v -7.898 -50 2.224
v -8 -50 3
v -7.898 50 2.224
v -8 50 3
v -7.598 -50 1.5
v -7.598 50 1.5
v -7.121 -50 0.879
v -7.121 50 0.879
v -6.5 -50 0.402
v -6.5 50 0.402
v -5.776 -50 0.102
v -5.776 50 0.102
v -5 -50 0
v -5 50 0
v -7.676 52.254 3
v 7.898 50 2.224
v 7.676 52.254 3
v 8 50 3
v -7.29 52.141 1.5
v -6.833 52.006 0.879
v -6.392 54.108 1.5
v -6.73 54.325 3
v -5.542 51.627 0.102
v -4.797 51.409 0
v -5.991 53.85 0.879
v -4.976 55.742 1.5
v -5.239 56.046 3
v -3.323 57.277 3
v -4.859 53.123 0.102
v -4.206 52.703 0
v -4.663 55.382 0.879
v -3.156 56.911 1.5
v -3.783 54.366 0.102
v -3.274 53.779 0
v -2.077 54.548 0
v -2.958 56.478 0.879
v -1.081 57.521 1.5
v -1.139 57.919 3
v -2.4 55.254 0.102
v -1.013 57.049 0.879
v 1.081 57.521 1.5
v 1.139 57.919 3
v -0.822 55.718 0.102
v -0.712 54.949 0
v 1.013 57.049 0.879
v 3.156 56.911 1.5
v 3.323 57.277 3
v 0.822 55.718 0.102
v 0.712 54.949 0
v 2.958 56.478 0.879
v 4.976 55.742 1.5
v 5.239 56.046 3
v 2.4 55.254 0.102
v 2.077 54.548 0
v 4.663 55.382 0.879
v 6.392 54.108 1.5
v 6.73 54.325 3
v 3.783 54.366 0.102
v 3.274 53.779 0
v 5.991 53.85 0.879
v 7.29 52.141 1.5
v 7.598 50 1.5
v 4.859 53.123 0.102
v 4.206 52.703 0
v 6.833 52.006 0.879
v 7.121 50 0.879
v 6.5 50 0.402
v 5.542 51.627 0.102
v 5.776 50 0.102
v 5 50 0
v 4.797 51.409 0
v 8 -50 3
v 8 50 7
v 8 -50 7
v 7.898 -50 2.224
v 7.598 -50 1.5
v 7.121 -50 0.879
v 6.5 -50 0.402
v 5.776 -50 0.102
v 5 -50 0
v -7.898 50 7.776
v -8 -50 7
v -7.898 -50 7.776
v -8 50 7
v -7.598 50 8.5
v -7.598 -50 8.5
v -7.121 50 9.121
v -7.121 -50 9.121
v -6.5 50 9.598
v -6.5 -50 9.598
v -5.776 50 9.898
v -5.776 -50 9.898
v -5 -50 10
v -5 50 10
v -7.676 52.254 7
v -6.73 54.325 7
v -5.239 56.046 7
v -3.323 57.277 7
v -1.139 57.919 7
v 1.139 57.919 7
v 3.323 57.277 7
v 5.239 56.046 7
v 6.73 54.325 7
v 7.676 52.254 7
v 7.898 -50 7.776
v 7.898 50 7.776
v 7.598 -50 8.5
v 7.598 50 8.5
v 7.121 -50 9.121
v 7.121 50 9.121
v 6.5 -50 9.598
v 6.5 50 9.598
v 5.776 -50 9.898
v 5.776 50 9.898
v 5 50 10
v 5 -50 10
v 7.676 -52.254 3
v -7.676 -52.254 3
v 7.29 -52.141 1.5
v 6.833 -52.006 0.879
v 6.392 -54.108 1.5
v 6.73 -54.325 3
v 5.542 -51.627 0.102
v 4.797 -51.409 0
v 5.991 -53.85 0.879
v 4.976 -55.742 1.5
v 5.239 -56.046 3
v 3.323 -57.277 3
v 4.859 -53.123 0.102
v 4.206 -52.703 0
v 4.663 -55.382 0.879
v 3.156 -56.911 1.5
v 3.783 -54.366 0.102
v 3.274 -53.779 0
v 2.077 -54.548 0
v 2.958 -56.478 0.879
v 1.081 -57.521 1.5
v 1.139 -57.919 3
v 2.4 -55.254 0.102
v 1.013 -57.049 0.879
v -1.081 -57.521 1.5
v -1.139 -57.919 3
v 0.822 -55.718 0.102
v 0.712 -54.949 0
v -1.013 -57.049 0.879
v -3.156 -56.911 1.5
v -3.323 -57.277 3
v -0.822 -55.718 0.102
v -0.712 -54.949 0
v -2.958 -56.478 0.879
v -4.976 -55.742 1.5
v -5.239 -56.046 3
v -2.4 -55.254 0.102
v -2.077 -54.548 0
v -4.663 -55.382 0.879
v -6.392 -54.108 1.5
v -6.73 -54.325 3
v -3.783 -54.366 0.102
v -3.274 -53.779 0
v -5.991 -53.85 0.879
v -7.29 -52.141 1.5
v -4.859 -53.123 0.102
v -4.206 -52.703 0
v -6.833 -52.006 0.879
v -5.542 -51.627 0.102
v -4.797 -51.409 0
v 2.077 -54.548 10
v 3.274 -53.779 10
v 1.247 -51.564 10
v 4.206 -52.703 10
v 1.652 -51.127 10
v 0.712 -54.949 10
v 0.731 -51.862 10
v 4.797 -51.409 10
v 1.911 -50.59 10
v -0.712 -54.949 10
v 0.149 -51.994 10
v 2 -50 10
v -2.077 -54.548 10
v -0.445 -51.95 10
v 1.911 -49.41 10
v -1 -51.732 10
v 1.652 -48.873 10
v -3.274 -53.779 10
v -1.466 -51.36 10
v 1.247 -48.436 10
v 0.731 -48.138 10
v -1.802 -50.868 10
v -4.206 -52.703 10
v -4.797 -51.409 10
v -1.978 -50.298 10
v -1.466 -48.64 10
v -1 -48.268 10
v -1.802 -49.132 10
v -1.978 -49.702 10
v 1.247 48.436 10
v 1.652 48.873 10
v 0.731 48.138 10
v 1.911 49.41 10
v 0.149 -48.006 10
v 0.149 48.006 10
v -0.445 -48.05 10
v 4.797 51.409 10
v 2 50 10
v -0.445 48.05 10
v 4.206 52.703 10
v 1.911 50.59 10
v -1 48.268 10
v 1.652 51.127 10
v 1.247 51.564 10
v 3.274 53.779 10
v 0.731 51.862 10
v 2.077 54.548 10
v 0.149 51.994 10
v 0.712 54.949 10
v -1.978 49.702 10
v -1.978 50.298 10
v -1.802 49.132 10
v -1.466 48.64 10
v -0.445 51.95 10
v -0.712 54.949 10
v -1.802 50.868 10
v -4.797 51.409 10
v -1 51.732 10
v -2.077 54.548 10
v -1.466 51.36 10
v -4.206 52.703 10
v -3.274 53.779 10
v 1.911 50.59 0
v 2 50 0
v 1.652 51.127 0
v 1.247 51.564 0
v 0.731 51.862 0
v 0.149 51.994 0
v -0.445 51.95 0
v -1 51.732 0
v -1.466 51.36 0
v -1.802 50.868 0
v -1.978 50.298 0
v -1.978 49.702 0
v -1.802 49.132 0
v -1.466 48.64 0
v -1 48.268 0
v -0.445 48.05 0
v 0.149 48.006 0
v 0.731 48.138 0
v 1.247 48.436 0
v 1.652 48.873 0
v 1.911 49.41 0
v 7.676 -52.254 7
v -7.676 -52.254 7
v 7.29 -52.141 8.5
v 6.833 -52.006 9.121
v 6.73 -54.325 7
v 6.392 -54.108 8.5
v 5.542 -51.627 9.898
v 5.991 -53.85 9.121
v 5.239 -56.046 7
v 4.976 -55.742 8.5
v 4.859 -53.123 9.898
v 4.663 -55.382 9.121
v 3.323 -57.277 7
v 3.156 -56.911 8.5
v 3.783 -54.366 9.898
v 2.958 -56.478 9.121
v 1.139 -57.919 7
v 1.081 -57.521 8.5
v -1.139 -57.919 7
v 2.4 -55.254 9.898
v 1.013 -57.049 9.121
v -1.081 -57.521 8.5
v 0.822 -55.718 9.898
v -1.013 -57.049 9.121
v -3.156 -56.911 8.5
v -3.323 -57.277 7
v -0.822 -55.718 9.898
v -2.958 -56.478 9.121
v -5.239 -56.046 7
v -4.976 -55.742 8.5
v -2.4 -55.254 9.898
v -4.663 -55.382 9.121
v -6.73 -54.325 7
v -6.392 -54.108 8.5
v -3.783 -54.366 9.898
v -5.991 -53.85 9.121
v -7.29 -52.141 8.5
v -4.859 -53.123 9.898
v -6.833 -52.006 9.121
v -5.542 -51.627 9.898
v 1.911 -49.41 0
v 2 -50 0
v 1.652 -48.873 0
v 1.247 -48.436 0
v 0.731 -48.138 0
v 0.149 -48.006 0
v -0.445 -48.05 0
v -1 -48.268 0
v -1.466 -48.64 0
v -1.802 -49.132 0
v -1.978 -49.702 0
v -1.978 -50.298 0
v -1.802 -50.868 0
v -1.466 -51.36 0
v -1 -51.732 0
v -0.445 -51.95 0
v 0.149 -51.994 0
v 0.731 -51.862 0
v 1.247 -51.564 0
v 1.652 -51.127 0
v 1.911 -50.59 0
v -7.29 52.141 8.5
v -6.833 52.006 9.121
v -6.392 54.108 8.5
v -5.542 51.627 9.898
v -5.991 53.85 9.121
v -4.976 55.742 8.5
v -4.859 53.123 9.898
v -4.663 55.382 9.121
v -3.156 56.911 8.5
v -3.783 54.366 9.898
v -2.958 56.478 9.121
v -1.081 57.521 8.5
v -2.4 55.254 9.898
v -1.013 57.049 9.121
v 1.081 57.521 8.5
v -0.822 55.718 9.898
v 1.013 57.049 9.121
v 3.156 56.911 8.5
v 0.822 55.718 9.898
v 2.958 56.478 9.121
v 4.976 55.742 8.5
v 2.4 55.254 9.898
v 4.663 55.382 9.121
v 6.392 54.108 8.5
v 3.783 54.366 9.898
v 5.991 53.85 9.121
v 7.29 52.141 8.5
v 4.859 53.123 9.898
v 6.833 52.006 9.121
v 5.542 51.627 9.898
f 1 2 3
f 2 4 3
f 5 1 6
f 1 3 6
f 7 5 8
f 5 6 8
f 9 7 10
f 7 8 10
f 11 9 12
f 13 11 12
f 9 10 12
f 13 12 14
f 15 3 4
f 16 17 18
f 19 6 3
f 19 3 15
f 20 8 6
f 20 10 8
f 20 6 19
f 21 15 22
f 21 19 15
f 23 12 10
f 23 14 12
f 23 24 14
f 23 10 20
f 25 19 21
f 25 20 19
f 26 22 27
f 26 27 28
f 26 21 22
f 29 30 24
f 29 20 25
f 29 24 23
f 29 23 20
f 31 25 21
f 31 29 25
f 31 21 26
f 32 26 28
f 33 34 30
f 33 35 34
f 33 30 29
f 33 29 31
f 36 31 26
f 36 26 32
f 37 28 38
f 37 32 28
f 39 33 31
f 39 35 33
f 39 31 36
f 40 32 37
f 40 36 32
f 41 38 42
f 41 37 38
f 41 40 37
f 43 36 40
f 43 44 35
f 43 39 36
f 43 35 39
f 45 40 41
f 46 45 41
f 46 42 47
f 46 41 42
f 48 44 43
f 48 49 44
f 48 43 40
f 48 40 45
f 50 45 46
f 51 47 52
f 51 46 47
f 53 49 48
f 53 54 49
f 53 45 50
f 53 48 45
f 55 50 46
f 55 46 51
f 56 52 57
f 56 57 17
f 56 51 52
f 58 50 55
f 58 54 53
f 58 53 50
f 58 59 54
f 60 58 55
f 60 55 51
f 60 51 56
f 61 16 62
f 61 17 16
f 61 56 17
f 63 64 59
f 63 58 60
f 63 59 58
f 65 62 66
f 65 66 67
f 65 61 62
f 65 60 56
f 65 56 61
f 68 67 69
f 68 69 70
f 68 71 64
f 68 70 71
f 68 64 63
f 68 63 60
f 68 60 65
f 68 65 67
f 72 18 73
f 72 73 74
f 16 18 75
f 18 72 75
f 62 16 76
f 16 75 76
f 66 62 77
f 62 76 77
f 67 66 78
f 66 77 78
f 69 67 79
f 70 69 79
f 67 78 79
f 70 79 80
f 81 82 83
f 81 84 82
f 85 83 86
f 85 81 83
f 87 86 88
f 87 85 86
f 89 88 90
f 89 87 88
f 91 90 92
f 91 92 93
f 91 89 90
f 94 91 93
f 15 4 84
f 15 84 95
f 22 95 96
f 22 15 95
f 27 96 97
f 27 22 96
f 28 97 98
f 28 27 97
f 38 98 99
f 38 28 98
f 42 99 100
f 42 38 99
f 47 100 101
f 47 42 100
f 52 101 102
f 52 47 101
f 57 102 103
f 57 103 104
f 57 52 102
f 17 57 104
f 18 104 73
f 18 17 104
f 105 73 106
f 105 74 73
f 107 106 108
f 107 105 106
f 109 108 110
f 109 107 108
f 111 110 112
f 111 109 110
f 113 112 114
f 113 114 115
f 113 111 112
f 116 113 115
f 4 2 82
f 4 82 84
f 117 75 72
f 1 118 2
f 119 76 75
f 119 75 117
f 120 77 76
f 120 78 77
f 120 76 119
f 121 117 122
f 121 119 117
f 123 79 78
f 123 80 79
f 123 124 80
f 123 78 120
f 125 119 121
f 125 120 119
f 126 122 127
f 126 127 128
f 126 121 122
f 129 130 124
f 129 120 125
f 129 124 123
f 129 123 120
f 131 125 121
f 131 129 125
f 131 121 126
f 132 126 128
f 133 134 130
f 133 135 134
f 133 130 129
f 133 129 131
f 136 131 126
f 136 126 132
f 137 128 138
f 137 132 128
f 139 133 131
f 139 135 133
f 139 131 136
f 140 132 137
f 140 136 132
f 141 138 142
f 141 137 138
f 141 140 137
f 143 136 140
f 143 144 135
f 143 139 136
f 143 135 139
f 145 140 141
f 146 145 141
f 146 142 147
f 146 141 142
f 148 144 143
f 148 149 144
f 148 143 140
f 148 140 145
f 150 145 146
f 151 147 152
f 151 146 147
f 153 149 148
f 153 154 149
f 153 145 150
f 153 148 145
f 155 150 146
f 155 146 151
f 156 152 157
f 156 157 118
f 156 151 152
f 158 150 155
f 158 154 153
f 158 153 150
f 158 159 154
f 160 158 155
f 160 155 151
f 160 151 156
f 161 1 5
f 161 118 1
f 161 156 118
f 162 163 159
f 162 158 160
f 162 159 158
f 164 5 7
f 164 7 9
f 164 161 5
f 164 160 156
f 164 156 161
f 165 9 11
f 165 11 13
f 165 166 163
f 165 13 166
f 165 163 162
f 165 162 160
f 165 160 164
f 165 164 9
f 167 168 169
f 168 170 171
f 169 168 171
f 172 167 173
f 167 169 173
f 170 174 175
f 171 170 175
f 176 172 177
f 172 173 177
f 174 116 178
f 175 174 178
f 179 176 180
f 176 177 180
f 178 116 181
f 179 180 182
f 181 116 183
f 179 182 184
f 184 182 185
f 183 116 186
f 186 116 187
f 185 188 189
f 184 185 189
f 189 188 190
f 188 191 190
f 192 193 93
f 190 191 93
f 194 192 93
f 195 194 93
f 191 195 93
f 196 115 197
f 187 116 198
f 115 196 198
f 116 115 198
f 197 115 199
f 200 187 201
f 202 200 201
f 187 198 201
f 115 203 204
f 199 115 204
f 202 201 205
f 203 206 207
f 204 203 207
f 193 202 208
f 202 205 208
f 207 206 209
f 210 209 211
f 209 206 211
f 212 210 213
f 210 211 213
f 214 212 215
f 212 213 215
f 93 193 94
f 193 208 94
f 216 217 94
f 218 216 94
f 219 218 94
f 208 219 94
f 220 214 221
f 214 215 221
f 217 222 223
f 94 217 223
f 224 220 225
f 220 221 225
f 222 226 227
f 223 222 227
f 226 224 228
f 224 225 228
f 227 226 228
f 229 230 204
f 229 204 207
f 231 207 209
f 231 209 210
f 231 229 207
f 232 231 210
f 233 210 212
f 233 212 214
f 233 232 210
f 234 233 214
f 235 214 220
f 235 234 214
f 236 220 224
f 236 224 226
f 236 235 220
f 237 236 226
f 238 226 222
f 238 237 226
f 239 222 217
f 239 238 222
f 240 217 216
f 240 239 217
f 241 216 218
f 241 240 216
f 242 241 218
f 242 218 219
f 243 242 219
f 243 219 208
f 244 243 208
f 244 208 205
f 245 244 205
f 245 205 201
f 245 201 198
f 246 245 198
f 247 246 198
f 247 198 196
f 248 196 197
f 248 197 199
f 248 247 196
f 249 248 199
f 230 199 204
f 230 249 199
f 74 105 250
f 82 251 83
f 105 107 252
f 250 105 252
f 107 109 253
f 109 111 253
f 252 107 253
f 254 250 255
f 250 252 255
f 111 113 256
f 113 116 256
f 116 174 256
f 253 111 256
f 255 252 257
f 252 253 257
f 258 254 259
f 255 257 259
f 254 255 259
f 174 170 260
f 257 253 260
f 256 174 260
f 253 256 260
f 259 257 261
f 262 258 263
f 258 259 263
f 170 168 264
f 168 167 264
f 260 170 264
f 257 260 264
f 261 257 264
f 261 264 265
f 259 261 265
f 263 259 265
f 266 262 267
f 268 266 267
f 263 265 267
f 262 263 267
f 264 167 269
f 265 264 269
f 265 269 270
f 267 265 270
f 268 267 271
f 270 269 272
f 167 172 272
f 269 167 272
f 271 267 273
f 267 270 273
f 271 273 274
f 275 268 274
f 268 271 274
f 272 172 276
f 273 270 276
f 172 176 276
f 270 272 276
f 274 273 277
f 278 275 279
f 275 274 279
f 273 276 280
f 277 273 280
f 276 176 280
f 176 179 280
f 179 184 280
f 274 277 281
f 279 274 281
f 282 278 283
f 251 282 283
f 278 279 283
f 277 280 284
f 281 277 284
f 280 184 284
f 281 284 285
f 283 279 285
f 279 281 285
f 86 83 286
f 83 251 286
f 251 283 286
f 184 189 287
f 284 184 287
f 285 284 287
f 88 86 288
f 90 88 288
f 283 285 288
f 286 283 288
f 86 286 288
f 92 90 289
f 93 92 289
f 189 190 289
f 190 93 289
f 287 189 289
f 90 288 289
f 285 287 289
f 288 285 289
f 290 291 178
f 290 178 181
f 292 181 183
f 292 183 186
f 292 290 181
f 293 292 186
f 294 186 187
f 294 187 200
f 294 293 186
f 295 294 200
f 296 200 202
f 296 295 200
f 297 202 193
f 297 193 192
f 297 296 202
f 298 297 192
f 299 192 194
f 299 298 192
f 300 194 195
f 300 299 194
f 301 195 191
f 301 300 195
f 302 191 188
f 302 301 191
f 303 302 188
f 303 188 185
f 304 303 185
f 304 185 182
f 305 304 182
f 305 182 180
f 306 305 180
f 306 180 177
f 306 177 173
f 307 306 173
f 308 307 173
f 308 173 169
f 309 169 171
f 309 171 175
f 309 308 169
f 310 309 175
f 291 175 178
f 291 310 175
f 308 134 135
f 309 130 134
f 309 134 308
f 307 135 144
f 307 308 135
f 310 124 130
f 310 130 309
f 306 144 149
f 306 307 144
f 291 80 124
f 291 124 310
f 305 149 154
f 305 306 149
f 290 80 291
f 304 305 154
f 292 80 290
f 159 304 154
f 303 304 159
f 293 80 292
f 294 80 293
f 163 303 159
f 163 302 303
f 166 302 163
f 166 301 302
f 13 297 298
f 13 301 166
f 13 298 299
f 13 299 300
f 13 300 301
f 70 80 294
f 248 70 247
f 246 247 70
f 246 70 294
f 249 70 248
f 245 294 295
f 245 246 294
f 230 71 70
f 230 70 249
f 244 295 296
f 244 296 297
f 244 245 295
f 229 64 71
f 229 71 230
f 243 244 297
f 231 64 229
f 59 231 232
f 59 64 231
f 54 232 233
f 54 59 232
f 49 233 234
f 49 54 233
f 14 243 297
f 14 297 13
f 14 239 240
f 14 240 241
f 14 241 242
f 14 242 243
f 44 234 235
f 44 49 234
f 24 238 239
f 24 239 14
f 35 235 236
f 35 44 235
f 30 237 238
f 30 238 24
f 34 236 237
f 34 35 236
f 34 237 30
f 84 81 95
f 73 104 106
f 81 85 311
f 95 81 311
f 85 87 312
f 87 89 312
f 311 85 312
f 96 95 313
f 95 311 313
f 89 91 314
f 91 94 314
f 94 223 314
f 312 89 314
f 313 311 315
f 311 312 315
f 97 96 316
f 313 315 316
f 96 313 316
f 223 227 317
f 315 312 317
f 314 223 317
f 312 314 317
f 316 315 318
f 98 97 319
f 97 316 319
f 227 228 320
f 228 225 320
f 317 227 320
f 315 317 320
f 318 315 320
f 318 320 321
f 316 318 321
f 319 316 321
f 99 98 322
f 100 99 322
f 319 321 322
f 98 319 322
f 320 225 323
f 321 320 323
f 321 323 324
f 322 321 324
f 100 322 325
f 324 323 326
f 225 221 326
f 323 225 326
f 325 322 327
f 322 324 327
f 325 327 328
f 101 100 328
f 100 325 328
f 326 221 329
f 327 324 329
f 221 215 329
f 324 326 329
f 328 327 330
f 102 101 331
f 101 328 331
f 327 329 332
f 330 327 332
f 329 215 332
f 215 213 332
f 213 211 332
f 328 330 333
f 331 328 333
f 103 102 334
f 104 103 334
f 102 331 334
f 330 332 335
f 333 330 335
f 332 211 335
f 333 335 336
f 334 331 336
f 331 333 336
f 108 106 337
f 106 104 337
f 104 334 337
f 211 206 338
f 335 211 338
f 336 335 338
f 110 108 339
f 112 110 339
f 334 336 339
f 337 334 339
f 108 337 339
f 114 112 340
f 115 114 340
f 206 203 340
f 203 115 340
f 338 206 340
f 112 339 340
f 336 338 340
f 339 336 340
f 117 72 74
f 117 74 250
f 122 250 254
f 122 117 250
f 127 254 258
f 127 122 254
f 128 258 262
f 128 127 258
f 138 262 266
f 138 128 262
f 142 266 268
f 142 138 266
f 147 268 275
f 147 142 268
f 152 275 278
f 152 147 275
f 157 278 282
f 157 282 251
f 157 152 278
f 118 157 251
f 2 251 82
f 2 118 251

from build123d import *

# Parameters (mm, degrees)
SKETCH2_R           = 2
BOSS_EXTRUDE1_DEPTH = 10
FILLET2_R           = 3


with BuildPart() as part:
    # Sketch2 → Boss-Extrude1 (new body)
    with BuildSketch(Plane.XY):
        with BuildLine():
            Line((8, 50), (8, -50))
            ThreePointArc((8, -50), (0, -58), (-8, -50))
            Line((-8, -50), (-8, 50))
            ThreePointArc((-8, 50), (0, 58), (8, 50))
        make_face()
        with Locations((0, 50)):
            Circle(SKETCH2_R, mode=Mode.SUBTRACT)
        with Locations((0, -50)):
            Circle(SKETCH2_R, mode=Mode.SUBTRACT)
    extrude(amount=BOSS_EXTRUDE1_DEPTH)

    # Fillet2
    fillet2_edges = [part.edges().sort_by_distance(p)[0] for p in [
        (0, -58, 10),
        (8, 0, 10),
        (0, 58, 10),
        (8, 0, 0),
        (0, -58, 0),
        (-8, 0, 0),
        (0, 58, 0),
        (-8, 0, 10),
    ]]
    fillet(fillet2_edges, radius=FILLET2_R)


solid = part.part
